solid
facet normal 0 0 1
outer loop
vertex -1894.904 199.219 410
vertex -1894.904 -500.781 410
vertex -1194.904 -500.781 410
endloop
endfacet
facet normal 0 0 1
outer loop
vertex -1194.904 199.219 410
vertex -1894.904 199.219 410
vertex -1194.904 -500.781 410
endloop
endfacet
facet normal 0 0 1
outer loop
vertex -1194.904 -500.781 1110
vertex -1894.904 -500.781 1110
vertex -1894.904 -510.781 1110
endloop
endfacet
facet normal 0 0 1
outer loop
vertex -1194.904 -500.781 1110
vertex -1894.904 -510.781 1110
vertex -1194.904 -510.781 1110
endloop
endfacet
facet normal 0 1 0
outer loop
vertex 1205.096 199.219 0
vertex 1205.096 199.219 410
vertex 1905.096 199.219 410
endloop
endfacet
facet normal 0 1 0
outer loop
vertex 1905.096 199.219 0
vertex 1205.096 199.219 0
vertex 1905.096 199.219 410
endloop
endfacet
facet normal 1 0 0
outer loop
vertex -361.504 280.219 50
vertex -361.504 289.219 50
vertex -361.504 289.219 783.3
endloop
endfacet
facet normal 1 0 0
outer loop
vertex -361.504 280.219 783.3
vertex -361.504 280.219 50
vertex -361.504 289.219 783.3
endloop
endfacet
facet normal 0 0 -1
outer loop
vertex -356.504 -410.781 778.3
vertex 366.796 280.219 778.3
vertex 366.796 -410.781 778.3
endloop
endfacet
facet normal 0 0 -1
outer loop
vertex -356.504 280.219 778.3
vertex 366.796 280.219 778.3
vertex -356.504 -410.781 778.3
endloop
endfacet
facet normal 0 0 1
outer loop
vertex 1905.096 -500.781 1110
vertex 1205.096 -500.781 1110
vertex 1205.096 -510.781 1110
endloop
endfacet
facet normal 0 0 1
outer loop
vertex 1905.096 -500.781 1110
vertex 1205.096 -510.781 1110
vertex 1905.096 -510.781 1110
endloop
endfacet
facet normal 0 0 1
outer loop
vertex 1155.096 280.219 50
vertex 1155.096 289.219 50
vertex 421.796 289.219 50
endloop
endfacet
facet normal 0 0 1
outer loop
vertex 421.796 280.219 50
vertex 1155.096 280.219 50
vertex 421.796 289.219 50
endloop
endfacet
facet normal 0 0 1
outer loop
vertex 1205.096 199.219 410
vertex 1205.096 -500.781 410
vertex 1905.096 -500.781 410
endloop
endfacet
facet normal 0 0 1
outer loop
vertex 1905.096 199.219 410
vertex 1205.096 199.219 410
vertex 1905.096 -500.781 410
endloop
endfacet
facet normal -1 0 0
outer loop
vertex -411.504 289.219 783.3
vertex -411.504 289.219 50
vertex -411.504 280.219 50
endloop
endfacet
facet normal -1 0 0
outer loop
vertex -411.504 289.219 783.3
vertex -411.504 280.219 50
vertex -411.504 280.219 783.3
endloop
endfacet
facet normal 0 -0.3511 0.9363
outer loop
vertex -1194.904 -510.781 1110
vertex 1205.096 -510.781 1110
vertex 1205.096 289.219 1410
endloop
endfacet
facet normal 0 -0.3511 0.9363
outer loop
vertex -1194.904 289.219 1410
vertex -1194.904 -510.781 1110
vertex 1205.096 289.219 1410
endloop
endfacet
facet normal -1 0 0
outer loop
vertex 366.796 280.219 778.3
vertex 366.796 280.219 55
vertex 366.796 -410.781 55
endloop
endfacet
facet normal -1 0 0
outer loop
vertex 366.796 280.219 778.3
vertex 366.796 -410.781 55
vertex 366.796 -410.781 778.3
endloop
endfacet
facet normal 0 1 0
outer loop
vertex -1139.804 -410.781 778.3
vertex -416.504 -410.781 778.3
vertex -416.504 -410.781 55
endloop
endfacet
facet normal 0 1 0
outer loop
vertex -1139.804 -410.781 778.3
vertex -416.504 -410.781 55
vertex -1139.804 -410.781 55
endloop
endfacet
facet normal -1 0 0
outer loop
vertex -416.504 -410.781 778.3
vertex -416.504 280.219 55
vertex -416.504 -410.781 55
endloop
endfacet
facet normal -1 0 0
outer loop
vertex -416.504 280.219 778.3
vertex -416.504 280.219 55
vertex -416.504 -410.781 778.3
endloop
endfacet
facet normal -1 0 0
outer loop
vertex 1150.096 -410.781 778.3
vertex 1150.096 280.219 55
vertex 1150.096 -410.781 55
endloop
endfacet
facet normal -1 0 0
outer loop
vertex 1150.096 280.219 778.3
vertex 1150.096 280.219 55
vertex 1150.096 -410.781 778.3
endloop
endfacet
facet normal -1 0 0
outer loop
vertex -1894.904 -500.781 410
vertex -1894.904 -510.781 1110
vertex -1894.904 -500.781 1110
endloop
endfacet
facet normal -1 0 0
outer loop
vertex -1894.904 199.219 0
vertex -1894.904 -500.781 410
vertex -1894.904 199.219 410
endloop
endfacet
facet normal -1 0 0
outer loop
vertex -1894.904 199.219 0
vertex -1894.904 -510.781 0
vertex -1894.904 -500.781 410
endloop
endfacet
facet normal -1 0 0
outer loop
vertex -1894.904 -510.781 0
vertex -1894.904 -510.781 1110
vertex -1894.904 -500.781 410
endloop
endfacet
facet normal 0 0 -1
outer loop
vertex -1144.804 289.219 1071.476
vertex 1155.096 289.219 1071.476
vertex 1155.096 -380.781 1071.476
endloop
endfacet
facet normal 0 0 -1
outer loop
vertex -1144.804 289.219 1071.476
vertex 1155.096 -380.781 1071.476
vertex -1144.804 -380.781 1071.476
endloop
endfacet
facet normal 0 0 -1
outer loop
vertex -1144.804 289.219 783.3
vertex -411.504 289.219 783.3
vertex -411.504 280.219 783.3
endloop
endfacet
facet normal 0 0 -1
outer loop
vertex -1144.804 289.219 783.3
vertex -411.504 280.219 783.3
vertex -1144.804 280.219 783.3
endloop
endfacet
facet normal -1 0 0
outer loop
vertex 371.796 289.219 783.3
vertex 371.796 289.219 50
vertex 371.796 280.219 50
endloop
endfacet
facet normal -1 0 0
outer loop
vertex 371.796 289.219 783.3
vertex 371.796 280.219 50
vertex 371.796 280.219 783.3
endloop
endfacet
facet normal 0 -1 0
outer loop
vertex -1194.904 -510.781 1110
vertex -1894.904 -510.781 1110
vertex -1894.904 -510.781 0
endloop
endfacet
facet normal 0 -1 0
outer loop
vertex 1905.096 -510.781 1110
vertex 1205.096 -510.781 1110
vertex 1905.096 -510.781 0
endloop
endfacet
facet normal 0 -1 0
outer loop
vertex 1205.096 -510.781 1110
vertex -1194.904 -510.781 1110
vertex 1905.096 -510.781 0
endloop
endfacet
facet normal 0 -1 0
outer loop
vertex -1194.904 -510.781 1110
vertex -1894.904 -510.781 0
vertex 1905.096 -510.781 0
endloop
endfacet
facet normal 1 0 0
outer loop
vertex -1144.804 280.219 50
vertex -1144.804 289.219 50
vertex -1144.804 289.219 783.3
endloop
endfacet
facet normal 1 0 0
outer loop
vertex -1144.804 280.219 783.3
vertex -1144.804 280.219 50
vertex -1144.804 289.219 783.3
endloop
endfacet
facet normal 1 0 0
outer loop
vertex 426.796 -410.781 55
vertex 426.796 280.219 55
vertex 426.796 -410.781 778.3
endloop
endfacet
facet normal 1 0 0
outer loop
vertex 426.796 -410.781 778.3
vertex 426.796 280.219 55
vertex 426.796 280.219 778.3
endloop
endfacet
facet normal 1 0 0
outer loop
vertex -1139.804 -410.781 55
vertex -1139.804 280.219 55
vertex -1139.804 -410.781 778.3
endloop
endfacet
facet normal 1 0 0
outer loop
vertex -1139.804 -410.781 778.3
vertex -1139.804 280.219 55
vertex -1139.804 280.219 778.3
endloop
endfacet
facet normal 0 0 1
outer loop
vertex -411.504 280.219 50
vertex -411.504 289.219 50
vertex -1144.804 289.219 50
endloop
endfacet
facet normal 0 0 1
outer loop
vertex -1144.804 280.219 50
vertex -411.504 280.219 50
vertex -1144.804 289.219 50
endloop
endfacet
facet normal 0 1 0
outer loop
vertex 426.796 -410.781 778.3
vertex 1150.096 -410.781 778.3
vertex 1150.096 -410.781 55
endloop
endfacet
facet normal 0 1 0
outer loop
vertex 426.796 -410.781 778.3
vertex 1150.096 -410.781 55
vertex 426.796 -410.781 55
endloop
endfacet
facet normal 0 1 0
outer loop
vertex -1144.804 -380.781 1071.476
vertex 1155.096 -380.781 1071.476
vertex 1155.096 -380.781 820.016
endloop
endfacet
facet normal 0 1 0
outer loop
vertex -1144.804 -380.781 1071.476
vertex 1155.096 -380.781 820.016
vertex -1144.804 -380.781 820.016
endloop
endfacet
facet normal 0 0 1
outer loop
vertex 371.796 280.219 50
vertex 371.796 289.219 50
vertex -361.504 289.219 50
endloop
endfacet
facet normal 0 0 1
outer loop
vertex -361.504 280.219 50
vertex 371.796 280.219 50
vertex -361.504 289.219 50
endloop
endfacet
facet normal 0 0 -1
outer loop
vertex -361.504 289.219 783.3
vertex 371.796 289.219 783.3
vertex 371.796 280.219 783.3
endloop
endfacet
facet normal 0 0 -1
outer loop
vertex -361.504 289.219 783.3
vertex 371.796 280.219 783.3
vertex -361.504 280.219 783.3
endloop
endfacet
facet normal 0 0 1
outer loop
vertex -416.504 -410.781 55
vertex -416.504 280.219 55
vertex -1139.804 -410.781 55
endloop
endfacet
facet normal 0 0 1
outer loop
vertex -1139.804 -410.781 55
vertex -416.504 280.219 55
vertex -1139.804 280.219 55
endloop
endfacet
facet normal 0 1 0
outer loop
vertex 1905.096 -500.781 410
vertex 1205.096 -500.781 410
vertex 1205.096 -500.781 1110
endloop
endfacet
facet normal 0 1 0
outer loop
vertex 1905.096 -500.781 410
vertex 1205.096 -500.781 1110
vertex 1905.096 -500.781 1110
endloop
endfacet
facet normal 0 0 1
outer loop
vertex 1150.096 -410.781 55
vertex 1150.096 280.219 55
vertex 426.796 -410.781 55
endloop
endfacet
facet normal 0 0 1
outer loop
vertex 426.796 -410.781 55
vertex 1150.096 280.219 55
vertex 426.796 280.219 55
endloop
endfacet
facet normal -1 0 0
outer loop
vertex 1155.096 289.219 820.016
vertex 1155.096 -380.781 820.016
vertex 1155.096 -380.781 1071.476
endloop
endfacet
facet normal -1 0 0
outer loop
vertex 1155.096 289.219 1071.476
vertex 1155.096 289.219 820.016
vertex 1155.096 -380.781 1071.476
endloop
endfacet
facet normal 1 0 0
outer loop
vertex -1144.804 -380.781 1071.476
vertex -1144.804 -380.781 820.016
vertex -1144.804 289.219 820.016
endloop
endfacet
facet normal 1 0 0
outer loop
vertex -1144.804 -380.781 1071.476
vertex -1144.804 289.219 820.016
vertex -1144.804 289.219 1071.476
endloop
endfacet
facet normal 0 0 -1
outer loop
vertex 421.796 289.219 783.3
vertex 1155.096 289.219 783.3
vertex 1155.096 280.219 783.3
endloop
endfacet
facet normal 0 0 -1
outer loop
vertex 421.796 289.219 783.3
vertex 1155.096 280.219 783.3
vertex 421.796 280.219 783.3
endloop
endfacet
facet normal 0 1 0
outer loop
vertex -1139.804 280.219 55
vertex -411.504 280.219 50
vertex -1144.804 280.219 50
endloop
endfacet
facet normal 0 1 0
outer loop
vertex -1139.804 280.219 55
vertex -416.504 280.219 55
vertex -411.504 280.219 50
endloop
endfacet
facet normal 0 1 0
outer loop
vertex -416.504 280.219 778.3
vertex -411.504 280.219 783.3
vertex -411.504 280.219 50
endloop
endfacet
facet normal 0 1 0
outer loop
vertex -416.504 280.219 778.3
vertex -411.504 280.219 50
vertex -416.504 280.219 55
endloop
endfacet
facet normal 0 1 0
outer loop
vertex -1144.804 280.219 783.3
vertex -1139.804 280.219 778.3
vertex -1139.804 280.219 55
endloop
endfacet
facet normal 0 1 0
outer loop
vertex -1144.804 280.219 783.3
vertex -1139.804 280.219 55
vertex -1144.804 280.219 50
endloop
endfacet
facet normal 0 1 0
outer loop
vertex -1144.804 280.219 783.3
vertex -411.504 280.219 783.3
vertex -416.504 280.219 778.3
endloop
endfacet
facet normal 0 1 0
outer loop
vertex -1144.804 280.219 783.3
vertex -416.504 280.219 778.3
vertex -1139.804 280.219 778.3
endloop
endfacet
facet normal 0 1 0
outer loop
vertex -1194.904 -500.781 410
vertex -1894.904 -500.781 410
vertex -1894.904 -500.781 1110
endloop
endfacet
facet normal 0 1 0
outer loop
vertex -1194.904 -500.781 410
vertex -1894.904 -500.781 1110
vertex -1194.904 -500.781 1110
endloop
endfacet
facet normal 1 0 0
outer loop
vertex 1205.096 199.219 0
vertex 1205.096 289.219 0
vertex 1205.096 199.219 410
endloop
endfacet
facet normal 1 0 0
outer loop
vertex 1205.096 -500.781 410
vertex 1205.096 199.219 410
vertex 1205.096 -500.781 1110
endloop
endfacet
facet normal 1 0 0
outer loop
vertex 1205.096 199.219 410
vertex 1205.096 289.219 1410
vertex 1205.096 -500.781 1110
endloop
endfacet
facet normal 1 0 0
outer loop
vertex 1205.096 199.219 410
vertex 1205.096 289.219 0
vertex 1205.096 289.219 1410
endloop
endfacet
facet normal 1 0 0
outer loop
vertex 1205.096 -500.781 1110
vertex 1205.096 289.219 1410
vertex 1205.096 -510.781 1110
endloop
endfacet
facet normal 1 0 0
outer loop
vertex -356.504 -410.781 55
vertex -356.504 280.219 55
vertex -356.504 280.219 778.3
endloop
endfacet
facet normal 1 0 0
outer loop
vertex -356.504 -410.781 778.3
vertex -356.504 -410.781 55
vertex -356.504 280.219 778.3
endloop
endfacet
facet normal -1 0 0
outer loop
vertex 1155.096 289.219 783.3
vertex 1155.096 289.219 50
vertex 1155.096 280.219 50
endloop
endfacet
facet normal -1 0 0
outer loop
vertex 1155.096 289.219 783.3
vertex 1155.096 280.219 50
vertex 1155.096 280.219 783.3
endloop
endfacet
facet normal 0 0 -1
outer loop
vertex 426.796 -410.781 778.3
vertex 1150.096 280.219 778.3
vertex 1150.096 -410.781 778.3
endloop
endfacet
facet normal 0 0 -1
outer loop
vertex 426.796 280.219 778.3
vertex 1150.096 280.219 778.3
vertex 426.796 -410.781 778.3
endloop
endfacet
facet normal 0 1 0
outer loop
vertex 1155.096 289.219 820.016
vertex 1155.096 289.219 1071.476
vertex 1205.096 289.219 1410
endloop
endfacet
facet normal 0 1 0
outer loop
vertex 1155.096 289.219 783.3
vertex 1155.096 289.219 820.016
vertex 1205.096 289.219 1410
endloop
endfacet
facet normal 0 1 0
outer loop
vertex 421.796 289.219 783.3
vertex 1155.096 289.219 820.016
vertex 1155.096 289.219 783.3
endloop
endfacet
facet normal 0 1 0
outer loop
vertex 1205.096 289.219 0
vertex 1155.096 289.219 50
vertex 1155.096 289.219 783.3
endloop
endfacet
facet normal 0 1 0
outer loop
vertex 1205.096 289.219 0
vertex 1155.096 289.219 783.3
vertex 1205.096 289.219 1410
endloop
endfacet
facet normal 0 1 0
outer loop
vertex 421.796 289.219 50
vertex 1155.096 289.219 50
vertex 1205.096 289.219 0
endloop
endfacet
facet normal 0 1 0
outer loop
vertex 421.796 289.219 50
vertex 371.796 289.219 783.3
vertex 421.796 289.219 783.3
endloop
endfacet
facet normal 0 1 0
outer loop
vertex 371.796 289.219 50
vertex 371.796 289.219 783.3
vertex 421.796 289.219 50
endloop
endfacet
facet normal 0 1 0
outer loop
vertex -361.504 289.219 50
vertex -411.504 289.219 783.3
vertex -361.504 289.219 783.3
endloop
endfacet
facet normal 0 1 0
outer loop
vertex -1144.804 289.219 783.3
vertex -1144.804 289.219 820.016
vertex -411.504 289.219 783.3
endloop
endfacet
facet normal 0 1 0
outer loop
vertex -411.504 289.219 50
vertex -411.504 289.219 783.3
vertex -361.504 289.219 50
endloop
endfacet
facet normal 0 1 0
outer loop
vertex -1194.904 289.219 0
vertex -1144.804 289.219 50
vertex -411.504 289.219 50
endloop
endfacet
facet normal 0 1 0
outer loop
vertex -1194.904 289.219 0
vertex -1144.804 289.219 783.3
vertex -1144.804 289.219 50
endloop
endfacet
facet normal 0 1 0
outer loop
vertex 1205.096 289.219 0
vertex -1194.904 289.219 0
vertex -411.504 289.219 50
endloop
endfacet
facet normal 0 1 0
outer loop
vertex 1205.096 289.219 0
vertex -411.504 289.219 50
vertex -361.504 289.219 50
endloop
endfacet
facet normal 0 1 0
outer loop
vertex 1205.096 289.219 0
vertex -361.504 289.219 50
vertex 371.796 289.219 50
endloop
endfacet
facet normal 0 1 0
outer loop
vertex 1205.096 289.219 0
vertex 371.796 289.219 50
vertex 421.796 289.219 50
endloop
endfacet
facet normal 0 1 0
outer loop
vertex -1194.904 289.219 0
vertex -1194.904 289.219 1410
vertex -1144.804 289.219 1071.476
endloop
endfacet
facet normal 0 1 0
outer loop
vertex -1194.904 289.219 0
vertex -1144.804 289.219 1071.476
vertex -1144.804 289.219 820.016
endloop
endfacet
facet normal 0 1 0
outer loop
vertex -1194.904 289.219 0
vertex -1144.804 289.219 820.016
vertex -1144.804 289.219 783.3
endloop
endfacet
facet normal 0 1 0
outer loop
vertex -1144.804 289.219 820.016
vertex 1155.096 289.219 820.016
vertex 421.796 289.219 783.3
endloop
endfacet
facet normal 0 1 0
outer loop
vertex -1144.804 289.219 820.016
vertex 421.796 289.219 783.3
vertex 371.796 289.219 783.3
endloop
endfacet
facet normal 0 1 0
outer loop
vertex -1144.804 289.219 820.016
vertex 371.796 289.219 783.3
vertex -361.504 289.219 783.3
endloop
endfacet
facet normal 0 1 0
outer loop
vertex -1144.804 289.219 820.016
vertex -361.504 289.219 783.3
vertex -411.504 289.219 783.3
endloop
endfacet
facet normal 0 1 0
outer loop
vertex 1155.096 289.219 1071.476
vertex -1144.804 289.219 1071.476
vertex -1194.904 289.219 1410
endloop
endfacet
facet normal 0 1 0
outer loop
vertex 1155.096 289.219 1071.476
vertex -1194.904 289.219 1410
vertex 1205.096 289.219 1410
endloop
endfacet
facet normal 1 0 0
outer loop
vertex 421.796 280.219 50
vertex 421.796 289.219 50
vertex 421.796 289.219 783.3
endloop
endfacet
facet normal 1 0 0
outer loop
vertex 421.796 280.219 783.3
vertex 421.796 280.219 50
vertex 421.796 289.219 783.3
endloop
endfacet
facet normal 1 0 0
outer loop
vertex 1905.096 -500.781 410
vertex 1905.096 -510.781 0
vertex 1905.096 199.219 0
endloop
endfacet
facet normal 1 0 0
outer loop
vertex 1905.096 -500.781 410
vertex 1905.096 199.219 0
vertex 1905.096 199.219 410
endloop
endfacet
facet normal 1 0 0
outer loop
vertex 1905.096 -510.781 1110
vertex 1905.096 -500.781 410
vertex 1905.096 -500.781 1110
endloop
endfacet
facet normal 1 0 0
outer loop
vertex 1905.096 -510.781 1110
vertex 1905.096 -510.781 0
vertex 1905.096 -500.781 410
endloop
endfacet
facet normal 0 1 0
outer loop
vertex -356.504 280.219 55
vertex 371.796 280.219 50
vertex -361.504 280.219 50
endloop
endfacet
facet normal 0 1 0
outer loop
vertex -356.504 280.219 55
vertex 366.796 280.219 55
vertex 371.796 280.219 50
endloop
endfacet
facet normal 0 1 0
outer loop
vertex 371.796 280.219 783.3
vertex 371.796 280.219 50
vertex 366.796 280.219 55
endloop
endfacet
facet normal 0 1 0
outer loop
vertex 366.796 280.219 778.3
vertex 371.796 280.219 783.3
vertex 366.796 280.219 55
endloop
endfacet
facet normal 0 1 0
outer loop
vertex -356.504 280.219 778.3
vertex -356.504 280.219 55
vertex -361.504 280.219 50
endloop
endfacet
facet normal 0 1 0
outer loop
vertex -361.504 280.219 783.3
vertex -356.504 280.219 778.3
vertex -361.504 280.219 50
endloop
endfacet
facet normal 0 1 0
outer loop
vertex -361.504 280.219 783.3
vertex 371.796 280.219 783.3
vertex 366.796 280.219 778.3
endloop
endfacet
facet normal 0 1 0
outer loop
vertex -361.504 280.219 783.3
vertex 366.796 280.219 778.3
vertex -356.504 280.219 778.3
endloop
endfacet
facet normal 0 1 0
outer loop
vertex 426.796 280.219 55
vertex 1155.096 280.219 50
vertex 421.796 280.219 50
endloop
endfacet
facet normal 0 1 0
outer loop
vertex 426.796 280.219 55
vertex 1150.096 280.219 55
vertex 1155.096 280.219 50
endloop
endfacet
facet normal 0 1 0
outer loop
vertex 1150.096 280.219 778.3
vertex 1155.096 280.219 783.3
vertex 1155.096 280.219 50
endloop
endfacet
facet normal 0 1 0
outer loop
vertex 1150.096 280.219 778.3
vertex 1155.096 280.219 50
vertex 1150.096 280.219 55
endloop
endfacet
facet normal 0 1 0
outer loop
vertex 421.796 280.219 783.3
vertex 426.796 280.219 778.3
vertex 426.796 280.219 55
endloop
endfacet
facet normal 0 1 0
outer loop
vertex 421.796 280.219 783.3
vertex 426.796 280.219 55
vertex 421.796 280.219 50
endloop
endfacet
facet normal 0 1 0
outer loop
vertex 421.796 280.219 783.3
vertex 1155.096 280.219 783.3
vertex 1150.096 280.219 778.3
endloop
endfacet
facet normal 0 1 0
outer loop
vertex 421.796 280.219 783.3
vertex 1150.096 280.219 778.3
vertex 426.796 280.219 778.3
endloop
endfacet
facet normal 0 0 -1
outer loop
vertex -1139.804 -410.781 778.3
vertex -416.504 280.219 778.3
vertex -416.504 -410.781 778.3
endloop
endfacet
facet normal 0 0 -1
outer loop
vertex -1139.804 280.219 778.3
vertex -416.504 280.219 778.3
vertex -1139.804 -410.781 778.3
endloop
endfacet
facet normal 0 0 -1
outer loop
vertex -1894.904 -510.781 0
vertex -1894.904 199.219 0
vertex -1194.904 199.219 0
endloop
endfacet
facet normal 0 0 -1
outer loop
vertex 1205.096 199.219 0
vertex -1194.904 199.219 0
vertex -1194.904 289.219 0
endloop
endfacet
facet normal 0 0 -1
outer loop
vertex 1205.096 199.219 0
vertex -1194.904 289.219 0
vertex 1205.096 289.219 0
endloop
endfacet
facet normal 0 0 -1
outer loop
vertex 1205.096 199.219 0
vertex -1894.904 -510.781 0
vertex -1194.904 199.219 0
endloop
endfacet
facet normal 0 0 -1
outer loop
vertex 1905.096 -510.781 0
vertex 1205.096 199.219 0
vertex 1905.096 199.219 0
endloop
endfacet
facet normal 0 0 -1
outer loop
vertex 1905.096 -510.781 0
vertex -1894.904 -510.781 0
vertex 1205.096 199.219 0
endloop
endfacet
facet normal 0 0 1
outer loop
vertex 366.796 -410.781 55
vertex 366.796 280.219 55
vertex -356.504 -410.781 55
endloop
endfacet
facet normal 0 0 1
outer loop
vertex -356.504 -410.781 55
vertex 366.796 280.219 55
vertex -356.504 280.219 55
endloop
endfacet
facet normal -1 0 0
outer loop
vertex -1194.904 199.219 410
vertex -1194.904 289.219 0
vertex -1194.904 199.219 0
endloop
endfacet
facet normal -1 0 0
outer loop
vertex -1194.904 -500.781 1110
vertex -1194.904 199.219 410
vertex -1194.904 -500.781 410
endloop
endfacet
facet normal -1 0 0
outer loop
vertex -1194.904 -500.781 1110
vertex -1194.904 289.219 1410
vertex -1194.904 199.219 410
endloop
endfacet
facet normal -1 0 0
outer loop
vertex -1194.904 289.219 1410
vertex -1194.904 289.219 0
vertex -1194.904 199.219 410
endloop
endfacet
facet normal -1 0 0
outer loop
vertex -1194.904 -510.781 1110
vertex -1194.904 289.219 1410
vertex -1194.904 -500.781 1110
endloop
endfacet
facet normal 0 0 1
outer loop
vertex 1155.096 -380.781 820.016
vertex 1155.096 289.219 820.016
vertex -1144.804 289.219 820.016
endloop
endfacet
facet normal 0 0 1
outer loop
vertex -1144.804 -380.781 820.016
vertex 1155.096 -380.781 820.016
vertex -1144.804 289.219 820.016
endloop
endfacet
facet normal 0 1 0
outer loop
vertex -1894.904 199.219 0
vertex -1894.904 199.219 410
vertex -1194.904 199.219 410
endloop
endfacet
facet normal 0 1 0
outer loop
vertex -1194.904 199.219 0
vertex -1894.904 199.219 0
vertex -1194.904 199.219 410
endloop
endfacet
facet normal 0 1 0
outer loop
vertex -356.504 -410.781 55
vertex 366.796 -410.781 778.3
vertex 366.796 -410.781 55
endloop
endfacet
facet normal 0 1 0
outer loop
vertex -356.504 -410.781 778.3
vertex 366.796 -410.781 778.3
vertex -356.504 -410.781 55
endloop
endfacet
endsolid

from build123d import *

# Parameters (mm, degrees)
F0_W      = 2400
F0_H      = 800
F1_DEPTH  = 1110
F2_W      = 700
F2_H      = 410
F3_DEPTH  = 710
F4_W      = 3800
F4_H      = 10
F5_DEPTH  = 700
F7_DEPTH  = 2400
F8_W      = 733.3
F8_H      = 733.3
F8_W_2    = 723.3
F8_H_2    = 723.3
F8_W_3    = 723.2999893069
F8_H_3    = 723.2999893069
F9_DEPTH  = 9
F10_W     = 2299.9
F10_H     = 251.460313797
F11_DEPTH = 670
F12_W     = 723.2999893069
F12_H     = 723.2999893069
F12_W_2   = 723.3
F12_H_2   = 723.3
F13_DEPTH = 700


with BuildPart() as f1:
    # F0 (on Top) → F1 (new body)
    with BuildSketch(Plane.XY):
        with Locations((5.0959922373, -110.7812188551)):
            Rectangle(F0_W, F0_H)
    extrude(amount=F1_DEPTH)

    # F2 (on face) → F3 (join)
    with BuildSketch(Plane.XZ.offset(510.7812188551)):
        with Locations((-1544.9040077627, 205)):
            Rectangle(F2_W, F2_H)
        with Locations((1555.0959922373, 205)):
            Rectangle(F2_W, F2_H)
    extrude(amount=-F3_DEPTH)

    # F4 (on face) → F5 (join)
    with BuildSketch(Plane.XY.offset(410)):
        with Locations((5.0959922373, -505.7812188551)):
            Rectangle(F4_W, F4_H)
    extrude(amount=F5_DEPTH)

    # F6 (on face) → F7 (join, through all)
    with BuildSketch(Plane(origin=(-1194.9040077627, 0, 0), x_dir=(0, -1, 0), z_dir=(-1, 0, 0))):
        Polygon((-289.2187811449, 1410), (-289.2187811449, 1110), (500.7812188551, 1110), (510.7812188551, 1110), align=None)
    extrude(amount=-F7_DEPTH)

    # F8 (on face) → F9 (cut)
    with BuildSketch(Plane(origin=(0, 289.2187811449, 0), x_dir=(-1, 0, 0), z_dir=(0, 1, 0))):
        with Locations((-788.4459922373, 416.65)):
            Rectangle(F8_W, F8_H)
        with Locations((-788.4459922373, 416.65)):
            Rectangle(F8_W_2, F8_H_2, mode=Mode.SUBTRACT)
        with Locations((-5.1459922373, 416.65)):
            Rectangle(F8_W, F8_H)
        with Locations((-5.1459922373, 416.65)):
            Rectangle(F8_W_3, F8_H_3, mode=Mode.SUBTRACT)
        with Locations((778.1540077627, 416.65)):
            Rectangle(F8_W, F8_H)
        with Locations((778.1540077627, 416.65)):
            Rectangle(F8_W_2, F8_H_2, mode=Mode.SUBTRACT)
    extrude(amount=-F9_DEPTH, mode=Mode.SUBTRACT)

    # F10 (on face) → F11 (cut)
    with BuildSketch(Plane(origin=(0, 289.2187811449, 0), x_dir=(-1, 0, 0), z_dir=(0, 1, 0))):
        with Locations((-5.1459922373, 945.7460641861)):
            Rectangle(F10_W, F10_H)
    extrude(amount=-F11_DEPTH, mode=Mode.SUBTRACT)

    # F12 (on face) → F13 (cut)
    with BuildSketch(Plane(origin=(0, 289.2187811449, 0), x_dir=(-1, 0, 0), z_dir=(0, 1, 0))):
        with Locations((-5.1459922373, 416.65)):
            Rectangle(F12_W, F12_H)
        with Locations((778.1540077627, 416.65)):
            Rectangle(F12_W_2, F12_H_2)
        with Locations((-788.4459922373, 416.65)):
            Rectangle(F12_W_2, F12_H_2)
    extrude(amount=-F13_DEPTH, mode=Mode.SUBTRACT)


solid = f1.part
